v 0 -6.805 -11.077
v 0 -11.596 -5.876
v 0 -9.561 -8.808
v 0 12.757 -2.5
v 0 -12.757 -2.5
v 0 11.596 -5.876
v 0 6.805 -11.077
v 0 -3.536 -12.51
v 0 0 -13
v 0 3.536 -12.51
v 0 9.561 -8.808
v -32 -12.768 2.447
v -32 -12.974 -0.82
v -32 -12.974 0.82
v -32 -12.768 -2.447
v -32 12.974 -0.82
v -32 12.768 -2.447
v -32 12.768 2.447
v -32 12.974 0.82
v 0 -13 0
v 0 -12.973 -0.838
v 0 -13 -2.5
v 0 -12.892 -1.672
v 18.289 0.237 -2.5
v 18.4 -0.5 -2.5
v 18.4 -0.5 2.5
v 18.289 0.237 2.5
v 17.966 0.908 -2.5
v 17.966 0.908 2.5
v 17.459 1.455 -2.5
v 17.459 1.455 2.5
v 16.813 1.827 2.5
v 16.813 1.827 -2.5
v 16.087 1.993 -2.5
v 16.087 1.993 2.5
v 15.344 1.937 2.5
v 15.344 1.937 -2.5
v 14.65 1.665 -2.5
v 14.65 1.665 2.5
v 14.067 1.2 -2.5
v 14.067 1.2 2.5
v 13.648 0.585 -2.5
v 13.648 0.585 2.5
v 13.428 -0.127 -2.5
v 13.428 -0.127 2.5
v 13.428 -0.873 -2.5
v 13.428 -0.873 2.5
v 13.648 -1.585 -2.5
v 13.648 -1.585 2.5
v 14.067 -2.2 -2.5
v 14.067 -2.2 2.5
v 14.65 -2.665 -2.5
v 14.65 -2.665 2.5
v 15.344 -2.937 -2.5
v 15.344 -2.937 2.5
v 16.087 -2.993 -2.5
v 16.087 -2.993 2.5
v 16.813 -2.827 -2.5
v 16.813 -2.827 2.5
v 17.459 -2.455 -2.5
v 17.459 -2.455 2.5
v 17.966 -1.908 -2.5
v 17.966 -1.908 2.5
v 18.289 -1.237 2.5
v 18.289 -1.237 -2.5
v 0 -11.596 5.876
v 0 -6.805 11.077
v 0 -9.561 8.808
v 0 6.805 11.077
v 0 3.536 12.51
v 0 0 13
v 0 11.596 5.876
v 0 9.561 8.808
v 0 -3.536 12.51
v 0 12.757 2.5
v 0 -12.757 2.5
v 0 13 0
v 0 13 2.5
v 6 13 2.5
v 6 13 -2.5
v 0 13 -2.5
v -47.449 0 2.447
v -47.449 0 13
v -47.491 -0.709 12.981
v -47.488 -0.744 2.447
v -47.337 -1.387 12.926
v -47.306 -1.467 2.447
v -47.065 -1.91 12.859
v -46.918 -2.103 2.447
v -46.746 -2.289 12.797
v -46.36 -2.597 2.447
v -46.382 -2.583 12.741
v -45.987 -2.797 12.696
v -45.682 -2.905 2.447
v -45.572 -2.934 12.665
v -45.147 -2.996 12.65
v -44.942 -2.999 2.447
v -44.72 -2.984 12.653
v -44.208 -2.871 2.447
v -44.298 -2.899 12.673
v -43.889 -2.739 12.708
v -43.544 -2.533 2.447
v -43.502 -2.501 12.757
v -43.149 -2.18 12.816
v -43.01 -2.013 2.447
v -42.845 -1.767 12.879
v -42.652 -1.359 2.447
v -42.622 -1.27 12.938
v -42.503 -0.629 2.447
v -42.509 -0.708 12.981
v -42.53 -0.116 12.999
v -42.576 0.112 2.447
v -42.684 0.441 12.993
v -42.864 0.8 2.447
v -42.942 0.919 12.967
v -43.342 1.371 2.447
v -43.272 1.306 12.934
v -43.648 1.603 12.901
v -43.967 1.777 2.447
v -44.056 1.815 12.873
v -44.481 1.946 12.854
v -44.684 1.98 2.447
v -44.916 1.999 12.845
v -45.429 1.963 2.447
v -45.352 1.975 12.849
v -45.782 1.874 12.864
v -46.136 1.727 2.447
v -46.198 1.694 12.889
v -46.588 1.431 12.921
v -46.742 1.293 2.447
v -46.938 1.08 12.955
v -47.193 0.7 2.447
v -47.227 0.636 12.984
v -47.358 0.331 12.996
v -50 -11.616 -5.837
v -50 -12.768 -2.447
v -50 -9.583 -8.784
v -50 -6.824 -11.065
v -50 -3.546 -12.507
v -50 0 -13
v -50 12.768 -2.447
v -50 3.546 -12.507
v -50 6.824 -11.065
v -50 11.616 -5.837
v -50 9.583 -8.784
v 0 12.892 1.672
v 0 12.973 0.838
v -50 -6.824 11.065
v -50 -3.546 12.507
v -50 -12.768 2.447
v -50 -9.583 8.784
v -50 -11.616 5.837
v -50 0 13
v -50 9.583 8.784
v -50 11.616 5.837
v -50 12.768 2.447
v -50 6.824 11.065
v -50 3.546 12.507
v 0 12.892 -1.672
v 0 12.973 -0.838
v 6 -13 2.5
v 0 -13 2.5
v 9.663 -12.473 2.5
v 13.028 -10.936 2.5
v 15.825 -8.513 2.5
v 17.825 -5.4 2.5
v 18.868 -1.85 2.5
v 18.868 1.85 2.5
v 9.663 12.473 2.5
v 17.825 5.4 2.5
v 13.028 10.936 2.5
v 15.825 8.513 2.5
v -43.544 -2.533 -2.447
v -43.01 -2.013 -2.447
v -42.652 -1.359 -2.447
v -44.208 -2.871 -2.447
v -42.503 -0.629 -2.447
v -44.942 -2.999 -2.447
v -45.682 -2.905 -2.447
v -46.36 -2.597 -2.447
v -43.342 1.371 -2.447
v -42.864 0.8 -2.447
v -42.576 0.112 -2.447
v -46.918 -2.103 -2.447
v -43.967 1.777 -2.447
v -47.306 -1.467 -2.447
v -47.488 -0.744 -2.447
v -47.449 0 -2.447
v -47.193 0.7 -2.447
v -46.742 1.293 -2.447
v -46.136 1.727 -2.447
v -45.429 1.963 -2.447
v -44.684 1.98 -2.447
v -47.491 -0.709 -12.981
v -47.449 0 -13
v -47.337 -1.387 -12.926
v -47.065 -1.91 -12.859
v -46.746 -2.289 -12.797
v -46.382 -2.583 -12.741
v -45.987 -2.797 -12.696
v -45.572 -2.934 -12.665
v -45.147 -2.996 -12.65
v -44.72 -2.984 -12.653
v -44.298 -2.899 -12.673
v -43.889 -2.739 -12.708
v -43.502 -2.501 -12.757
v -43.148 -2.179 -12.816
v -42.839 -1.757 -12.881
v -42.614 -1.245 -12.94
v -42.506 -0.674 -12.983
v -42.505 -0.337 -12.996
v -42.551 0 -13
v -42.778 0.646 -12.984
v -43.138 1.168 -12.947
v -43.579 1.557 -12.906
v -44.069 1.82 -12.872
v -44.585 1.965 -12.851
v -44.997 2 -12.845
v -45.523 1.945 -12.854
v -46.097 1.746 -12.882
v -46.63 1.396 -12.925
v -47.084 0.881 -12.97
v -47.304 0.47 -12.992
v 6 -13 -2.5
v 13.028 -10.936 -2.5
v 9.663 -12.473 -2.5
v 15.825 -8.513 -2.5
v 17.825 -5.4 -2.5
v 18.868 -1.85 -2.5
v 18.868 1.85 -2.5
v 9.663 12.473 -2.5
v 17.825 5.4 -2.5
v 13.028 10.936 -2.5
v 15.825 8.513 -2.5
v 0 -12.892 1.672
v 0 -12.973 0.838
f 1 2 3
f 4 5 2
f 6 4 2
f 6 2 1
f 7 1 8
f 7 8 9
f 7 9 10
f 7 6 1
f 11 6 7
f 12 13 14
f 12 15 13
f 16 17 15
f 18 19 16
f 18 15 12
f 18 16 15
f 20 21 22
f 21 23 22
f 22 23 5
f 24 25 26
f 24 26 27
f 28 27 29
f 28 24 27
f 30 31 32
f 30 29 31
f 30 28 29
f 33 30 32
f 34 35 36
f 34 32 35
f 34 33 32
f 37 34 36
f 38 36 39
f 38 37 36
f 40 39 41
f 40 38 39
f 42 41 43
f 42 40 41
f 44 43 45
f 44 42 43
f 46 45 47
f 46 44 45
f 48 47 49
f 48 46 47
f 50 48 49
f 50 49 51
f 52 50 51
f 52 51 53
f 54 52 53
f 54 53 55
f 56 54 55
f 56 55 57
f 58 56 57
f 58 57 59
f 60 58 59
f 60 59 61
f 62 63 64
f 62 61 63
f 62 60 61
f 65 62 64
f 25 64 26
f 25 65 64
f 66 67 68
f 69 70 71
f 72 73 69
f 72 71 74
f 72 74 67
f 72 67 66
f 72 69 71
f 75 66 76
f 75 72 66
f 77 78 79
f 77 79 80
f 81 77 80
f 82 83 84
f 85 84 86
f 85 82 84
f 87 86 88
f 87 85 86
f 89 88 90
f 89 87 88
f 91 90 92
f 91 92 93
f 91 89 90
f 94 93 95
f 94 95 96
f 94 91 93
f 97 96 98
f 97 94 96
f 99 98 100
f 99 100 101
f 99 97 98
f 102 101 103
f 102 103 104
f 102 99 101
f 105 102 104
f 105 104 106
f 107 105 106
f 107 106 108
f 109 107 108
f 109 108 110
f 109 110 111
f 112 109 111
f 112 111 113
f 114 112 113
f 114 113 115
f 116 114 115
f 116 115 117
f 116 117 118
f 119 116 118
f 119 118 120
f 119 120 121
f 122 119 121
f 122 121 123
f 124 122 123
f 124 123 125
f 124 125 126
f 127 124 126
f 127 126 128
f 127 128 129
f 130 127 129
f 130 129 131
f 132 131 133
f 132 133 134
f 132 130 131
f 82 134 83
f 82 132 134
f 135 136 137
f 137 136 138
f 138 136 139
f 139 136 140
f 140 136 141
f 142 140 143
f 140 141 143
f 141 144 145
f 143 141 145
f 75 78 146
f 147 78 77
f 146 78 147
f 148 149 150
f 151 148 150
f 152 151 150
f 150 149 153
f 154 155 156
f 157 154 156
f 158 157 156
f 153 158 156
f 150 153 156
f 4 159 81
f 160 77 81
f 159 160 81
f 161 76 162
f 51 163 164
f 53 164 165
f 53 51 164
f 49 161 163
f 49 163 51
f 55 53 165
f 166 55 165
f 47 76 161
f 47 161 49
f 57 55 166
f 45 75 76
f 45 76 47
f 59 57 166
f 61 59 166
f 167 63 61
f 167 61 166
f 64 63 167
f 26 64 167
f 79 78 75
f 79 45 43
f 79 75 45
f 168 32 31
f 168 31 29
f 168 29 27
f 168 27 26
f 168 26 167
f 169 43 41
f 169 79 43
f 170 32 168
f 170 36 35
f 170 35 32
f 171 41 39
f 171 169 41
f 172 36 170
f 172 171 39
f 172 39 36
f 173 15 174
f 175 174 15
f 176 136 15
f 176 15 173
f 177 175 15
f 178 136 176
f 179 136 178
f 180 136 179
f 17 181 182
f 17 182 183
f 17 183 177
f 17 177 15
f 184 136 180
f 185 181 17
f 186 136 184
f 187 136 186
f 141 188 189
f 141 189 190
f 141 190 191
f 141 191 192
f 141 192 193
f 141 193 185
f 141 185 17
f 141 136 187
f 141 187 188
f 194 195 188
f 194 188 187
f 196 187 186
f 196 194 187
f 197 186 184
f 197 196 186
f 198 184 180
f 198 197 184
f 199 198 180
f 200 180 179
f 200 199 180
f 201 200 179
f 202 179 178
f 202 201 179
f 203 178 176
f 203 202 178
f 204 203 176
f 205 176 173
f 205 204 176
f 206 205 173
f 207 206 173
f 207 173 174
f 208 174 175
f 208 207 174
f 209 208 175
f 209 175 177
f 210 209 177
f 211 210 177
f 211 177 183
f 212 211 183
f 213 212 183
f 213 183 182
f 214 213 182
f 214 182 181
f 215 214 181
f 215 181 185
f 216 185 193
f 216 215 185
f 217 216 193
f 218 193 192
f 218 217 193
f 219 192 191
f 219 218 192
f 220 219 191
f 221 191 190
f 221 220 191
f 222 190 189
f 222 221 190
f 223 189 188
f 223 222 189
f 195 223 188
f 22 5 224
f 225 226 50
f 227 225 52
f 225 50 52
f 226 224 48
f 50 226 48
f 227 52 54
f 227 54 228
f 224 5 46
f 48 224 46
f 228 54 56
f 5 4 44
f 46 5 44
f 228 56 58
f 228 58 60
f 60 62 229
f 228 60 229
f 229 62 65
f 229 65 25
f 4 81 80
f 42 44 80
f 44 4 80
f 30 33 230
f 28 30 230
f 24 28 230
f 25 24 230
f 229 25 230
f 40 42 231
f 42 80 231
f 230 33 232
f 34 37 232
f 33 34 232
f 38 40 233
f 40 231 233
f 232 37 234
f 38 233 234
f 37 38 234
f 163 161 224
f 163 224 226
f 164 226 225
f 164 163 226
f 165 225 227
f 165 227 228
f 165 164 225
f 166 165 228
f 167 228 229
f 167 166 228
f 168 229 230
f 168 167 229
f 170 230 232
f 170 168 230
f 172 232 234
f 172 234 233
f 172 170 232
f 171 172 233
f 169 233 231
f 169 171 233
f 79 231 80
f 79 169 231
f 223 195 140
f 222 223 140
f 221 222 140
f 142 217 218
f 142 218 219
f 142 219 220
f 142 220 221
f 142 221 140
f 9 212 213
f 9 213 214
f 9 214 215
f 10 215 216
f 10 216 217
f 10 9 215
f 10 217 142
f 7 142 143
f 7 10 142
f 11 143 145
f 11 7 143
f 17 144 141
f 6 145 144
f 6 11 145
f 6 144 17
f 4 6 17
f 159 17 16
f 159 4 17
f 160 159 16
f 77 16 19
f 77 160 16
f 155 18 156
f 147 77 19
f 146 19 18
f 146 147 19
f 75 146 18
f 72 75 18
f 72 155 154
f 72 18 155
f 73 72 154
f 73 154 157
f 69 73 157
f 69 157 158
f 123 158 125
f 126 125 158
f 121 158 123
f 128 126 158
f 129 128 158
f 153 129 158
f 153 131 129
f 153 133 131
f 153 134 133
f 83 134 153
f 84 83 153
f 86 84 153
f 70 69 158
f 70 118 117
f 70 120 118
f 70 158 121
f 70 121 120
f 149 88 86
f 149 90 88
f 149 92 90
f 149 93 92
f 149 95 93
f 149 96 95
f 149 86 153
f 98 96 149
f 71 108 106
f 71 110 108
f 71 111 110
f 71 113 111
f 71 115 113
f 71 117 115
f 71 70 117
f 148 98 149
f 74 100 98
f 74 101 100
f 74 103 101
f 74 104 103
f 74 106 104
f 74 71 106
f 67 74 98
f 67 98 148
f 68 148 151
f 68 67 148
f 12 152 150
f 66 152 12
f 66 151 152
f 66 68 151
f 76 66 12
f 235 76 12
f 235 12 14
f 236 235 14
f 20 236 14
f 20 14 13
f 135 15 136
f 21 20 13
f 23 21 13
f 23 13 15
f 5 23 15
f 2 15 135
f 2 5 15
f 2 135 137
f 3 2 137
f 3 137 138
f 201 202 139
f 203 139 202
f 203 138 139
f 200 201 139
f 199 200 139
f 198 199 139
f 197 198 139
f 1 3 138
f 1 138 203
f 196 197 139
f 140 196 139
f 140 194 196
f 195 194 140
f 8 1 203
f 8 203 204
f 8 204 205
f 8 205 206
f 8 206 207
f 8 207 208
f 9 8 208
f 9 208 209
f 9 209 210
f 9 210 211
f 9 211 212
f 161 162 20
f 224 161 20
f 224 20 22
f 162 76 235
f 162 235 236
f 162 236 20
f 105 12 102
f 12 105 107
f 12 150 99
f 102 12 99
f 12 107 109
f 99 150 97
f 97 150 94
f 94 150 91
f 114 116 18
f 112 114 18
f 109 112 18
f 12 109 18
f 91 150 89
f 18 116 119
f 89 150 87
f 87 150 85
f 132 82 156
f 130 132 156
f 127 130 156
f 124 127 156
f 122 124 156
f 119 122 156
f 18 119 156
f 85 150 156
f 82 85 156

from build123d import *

# Parameters (mm, degrees)
SKETCH1_R               = 13
BOSS_EXTRUDE1_DEPTH     = 50
SKETCH6_W               = 5
SKETCH6_H               = 26
BOSS_EXTRUDE3_DEPTH     = 6
BOSS_EXTRUDE4_DEPTH     = 5
CUT_EXTRUDE1_DEPTH      = 54.937463789
CUT_EXTRUDE1_DEPTH_BACK = 54.937463789
SKETCH10_R              = 2.5
SKETCH12_W              = 4.8936145
SKETCH12_H              = 26
CUT_EXTRUDE2_DEPTH      = 18
CUT_EXTRUDE3_DEPTH      = 54.272882407
CUT_EXTRUDE3_DEPTH_BACK = 54.272882407
SKETCH13_R              = 2.5


with BuildPart() as part:
    # Sketch1 → Boss-Extrude1 (new body)
    with BuildSketch(Plane(origin=(0, 0, 0), x_dir=(0, 0, -1), z_dir=(1, 0, 0))):
        Circle(SKETCH1_R)
    extrude(amount=-BOSS_EXTRUDE1_DEPTH)

    # Sketch6 → Boss-Extrude3 (add)
    with BuildSketch(Plane(origin=(0, 0, 0), x_dir=(0, 0, -1), z_dir=(1, 0, 0))):
        Rectangle(SKETCH6_W, SKETCH6_H)
    extrude(amount=BOSS_EXTRUDE3_DEPTH)

    # Sketch8 → Boss-Extrude4 (add)
    with BuildSketch(Plane.XY.offset(2.5)):
        with BuildLine():
            Line((6, 13), (6, -13))
            ThreePointArc((6, -13), (19, 0), (6, 13))
        make_face()
    extrude(amount=-BOSS_EXTRUDE4_DEPTH)

    # Sketch10 → Cut-Extrude1 (cut, two sides: drawn at the far end of the back side and taken through both)
    with BuildSketch(Plane.XY.offset(2.5).offset(-CUT_EXTRUDE1_DEPTH_BACK)):
        with Locations((15.9, -0.5)):
            Circle(SKETCH10_R)
    extrude(amount=CUT_EXTRUDE1_DEPTH + CUT_EXTRUDE1_DEPTH_BACK, mode=Mode.SUBTRACT)

    # Sketch12 → Cut-Extrude2 (cut)
    with BuildSketch(Plane.ZY.offset(50)):
        Rectangle(SKETCH12_W, SKETCH12_H)
    extrude(amount=-CUT_EXTRUDE2_DEPTH, mode=Mode.SUBTRACT)

    # Sketch13 → Cut-Extrude3 (cut, two sides: drawn at the far end of the back side and taken through both)
    with BuildSketch(Plane.XY.offset(-CUT_EXTRUDE3_DEPTH_BACK)):
        with Locations(Location((-45, -0.5, 0), (0, 0, 168.463040967))):
            Circle(SKETCH13_R)
    extrude(amount=CUT_EXTRUDE3_DEPTH + CUT_EXTRUDE3_DEPTH_BACK, mode=Mode.SUBTRACT)


solid = part.part
